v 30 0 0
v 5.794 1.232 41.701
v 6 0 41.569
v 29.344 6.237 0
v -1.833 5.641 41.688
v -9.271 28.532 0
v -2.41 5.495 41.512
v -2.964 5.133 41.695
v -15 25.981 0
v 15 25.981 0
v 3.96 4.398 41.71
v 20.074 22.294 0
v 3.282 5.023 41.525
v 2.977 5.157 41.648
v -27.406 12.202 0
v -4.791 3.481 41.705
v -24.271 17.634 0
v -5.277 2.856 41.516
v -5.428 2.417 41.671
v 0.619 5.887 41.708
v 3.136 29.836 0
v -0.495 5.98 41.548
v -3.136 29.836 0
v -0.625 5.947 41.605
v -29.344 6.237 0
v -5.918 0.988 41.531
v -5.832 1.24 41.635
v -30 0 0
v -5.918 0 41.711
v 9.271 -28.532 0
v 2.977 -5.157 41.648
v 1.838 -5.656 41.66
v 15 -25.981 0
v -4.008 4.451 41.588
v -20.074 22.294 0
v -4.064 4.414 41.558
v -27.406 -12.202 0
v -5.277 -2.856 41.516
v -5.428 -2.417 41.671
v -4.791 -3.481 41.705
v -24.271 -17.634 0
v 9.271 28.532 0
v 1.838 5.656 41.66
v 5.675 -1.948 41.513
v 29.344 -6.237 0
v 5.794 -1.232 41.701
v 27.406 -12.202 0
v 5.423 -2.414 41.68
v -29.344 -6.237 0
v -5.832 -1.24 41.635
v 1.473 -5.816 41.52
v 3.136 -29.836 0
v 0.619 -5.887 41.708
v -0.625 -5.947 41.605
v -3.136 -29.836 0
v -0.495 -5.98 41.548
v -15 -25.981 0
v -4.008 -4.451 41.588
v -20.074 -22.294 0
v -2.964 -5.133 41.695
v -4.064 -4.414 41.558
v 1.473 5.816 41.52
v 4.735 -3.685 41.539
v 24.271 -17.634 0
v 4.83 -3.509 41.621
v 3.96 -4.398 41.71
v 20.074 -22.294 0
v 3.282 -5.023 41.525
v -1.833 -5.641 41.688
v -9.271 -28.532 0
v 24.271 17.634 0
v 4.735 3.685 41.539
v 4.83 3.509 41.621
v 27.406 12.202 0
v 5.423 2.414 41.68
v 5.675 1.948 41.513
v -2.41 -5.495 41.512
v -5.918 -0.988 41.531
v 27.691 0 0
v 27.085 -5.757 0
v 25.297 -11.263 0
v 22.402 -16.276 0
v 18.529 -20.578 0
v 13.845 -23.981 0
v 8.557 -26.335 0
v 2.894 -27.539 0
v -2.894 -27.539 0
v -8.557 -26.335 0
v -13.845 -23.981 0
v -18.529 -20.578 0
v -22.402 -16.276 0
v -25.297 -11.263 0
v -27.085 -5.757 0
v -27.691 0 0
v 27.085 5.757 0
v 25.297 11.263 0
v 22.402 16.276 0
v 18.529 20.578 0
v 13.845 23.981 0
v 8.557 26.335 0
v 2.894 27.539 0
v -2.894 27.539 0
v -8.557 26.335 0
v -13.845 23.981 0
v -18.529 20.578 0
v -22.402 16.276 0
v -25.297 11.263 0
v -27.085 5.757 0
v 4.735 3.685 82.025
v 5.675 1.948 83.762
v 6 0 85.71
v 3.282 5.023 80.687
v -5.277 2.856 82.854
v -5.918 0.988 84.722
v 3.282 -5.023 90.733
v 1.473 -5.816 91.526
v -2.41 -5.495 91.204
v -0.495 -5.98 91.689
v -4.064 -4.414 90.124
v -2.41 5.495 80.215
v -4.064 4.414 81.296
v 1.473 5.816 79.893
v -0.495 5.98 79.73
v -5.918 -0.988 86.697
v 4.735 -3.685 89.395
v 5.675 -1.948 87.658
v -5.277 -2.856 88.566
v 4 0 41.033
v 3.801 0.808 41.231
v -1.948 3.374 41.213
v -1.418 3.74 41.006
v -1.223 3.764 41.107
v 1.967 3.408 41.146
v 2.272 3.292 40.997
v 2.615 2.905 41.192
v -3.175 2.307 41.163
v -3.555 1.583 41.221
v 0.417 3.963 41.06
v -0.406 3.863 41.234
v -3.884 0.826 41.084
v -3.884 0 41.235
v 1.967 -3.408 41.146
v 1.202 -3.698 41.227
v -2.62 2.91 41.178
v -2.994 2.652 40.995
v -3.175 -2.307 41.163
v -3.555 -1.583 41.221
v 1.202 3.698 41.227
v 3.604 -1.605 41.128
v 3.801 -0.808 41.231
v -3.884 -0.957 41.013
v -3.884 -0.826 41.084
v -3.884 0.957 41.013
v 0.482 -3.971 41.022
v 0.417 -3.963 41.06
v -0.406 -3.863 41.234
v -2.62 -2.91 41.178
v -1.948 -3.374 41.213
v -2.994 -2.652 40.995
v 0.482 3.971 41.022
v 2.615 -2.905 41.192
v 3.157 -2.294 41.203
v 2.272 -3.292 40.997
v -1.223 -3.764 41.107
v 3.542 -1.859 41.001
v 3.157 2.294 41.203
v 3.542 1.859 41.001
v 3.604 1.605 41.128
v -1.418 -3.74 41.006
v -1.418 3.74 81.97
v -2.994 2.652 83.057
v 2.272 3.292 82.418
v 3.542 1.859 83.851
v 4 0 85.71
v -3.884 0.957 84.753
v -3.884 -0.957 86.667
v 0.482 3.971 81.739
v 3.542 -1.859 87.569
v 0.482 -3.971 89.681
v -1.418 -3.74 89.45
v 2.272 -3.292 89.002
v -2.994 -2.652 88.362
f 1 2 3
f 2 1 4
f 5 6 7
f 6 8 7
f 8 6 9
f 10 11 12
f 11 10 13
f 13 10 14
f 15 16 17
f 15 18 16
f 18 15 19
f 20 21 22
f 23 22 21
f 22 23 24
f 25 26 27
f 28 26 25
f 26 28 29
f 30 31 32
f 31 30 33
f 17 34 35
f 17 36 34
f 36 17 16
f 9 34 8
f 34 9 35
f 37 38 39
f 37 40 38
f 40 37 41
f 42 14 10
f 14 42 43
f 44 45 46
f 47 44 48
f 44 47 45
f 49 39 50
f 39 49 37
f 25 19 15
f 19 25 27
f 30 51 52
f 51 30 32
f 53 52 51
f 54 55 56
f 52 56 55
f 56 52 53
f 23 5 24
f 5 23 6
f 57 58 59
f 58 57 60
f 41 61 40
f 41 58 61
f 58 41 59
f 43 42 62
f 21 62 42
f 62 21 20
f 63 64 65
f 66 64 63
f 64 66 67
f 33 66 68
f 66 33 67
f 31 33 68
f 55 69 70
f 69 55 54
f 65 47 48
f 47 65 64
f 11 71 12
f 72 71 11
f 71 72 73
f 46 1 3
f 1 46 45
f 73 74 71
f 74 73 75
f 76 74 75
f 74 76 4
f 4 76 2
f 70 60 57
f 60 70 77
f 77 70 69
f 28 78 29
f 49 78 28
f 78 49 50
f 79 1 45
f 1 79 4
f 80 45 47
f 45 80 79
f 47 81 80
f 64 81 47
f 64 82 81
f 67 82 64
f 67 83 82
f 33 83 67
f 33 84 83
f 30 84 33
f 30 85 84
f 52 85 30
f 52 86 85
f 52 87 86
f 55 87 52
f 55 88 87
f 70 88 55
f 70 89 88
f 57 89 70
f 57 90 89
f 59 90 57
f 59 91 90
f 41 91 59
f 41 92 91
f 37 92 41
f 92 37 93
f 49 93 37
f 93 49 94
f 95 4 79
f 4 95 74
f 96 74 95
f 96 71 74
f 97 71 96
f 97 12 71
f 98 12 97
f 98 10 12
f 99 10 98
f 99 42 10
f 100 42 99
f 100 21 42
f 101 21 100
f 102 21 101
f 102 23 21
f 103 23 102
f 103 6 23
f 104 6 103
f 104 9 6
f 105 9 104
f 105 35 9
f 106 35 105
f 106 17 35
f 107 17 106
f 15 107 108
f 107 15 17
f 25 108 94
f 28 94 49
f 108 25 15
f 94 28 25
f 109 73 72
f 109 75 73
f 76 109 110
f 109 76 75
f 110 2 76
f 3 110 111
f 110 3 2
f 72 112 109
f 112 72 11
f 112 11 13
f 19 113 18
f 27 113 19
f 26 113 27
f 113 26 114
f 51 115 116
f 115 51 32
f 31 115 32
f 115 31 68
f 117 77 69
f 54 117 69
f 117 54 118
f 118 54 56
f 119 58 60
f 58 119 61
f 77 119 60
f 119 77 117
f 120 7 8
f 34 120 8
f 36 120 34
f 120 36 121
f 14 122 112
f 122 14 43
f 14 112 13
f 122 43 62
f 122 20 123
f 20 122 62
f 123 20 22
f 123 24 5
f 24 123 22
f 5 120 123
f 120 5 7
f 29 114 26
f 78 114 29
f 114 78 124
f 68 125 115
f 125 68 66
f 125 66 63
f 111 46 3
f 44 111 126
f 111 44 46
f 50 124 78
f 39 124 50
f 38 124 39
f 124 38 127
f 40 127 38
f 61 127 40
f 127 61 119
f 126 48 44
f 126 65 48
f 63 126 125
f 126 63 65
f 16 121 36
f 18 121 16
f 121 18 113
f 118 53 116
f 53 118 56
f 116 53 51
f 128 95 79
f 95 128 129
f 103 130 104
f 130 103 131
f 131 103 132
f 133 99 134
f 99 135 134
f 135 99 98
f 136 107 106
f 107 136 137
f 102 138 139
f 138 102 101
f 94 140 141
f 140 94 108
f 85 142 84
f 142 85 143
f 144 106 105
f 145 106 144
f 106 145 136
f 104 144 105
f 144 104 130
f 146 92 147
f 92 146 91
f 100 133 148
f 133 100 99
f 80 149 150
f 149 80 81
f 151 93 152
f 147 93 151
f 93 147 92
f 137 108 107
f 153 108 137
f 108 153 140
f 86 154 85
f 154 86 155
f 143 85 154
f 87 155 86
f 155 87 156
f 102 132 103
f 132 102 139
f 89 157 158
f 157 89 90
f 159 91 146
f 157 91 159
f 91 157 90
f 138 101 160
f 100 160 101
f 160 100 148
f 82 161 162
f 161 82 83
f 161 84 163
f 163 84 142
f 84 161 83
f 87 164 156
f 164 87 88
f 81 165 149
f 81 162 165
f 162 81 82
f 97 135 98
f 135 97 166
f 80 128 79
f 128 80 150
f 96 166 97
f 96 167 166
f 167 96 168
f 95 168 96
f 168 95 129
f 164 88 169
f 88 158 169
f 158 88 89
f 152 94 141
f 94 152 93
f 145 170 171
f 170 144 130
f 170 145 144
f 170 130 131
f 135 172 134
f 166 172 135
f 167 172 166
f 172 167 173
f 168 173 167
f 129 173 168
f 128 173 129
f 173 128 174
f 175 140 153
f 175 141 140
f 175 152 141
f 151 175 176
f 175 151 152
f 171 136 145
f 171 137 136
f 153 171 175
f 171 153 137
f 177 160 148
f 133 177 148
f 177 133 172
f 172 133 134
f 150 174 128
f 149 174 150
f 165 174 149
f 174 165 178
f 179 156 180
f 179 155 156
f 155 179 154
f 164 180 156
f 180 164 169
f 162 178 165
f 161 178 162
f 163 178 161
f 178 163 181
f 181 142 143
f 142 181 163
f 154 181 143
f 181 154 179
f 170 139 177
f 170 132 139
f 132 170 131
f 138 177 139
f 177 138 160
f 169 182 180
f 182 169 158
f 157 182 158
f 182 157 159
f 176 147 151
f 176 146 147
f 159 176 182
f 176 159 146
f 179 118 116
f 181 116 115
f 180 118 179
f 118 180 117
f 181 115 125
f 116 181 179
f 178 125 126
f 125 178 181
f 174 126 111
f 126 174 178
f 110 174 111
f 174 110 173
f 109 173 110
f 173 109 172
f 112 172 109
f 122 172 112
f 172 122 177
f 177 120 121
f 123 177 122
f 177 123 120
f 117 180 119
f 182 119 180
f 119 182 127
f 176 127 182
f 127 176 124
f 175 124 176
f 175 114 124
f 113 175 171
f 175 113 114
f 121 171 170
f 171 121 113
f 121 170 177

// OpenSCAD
R=30;
H=sqrt(3)*R;
thick=2;
Rpipe=4;

difference(){
    union(){
        cylinder(r1=R, r2=0, h=H);
        cylinder(r=Rpipe+thick, h=H*2);
    }
    translate([0,0,-thick*2]){
        cylinder(r1=R, r2=0, h=H);
    }
    cylinder(r=Rpipe, h=H*2+1);
    translate([0,6,H*2-3]){
        rotate([45,0,0]){
            cube([30,30,30],center=true);
        }
    }
}
